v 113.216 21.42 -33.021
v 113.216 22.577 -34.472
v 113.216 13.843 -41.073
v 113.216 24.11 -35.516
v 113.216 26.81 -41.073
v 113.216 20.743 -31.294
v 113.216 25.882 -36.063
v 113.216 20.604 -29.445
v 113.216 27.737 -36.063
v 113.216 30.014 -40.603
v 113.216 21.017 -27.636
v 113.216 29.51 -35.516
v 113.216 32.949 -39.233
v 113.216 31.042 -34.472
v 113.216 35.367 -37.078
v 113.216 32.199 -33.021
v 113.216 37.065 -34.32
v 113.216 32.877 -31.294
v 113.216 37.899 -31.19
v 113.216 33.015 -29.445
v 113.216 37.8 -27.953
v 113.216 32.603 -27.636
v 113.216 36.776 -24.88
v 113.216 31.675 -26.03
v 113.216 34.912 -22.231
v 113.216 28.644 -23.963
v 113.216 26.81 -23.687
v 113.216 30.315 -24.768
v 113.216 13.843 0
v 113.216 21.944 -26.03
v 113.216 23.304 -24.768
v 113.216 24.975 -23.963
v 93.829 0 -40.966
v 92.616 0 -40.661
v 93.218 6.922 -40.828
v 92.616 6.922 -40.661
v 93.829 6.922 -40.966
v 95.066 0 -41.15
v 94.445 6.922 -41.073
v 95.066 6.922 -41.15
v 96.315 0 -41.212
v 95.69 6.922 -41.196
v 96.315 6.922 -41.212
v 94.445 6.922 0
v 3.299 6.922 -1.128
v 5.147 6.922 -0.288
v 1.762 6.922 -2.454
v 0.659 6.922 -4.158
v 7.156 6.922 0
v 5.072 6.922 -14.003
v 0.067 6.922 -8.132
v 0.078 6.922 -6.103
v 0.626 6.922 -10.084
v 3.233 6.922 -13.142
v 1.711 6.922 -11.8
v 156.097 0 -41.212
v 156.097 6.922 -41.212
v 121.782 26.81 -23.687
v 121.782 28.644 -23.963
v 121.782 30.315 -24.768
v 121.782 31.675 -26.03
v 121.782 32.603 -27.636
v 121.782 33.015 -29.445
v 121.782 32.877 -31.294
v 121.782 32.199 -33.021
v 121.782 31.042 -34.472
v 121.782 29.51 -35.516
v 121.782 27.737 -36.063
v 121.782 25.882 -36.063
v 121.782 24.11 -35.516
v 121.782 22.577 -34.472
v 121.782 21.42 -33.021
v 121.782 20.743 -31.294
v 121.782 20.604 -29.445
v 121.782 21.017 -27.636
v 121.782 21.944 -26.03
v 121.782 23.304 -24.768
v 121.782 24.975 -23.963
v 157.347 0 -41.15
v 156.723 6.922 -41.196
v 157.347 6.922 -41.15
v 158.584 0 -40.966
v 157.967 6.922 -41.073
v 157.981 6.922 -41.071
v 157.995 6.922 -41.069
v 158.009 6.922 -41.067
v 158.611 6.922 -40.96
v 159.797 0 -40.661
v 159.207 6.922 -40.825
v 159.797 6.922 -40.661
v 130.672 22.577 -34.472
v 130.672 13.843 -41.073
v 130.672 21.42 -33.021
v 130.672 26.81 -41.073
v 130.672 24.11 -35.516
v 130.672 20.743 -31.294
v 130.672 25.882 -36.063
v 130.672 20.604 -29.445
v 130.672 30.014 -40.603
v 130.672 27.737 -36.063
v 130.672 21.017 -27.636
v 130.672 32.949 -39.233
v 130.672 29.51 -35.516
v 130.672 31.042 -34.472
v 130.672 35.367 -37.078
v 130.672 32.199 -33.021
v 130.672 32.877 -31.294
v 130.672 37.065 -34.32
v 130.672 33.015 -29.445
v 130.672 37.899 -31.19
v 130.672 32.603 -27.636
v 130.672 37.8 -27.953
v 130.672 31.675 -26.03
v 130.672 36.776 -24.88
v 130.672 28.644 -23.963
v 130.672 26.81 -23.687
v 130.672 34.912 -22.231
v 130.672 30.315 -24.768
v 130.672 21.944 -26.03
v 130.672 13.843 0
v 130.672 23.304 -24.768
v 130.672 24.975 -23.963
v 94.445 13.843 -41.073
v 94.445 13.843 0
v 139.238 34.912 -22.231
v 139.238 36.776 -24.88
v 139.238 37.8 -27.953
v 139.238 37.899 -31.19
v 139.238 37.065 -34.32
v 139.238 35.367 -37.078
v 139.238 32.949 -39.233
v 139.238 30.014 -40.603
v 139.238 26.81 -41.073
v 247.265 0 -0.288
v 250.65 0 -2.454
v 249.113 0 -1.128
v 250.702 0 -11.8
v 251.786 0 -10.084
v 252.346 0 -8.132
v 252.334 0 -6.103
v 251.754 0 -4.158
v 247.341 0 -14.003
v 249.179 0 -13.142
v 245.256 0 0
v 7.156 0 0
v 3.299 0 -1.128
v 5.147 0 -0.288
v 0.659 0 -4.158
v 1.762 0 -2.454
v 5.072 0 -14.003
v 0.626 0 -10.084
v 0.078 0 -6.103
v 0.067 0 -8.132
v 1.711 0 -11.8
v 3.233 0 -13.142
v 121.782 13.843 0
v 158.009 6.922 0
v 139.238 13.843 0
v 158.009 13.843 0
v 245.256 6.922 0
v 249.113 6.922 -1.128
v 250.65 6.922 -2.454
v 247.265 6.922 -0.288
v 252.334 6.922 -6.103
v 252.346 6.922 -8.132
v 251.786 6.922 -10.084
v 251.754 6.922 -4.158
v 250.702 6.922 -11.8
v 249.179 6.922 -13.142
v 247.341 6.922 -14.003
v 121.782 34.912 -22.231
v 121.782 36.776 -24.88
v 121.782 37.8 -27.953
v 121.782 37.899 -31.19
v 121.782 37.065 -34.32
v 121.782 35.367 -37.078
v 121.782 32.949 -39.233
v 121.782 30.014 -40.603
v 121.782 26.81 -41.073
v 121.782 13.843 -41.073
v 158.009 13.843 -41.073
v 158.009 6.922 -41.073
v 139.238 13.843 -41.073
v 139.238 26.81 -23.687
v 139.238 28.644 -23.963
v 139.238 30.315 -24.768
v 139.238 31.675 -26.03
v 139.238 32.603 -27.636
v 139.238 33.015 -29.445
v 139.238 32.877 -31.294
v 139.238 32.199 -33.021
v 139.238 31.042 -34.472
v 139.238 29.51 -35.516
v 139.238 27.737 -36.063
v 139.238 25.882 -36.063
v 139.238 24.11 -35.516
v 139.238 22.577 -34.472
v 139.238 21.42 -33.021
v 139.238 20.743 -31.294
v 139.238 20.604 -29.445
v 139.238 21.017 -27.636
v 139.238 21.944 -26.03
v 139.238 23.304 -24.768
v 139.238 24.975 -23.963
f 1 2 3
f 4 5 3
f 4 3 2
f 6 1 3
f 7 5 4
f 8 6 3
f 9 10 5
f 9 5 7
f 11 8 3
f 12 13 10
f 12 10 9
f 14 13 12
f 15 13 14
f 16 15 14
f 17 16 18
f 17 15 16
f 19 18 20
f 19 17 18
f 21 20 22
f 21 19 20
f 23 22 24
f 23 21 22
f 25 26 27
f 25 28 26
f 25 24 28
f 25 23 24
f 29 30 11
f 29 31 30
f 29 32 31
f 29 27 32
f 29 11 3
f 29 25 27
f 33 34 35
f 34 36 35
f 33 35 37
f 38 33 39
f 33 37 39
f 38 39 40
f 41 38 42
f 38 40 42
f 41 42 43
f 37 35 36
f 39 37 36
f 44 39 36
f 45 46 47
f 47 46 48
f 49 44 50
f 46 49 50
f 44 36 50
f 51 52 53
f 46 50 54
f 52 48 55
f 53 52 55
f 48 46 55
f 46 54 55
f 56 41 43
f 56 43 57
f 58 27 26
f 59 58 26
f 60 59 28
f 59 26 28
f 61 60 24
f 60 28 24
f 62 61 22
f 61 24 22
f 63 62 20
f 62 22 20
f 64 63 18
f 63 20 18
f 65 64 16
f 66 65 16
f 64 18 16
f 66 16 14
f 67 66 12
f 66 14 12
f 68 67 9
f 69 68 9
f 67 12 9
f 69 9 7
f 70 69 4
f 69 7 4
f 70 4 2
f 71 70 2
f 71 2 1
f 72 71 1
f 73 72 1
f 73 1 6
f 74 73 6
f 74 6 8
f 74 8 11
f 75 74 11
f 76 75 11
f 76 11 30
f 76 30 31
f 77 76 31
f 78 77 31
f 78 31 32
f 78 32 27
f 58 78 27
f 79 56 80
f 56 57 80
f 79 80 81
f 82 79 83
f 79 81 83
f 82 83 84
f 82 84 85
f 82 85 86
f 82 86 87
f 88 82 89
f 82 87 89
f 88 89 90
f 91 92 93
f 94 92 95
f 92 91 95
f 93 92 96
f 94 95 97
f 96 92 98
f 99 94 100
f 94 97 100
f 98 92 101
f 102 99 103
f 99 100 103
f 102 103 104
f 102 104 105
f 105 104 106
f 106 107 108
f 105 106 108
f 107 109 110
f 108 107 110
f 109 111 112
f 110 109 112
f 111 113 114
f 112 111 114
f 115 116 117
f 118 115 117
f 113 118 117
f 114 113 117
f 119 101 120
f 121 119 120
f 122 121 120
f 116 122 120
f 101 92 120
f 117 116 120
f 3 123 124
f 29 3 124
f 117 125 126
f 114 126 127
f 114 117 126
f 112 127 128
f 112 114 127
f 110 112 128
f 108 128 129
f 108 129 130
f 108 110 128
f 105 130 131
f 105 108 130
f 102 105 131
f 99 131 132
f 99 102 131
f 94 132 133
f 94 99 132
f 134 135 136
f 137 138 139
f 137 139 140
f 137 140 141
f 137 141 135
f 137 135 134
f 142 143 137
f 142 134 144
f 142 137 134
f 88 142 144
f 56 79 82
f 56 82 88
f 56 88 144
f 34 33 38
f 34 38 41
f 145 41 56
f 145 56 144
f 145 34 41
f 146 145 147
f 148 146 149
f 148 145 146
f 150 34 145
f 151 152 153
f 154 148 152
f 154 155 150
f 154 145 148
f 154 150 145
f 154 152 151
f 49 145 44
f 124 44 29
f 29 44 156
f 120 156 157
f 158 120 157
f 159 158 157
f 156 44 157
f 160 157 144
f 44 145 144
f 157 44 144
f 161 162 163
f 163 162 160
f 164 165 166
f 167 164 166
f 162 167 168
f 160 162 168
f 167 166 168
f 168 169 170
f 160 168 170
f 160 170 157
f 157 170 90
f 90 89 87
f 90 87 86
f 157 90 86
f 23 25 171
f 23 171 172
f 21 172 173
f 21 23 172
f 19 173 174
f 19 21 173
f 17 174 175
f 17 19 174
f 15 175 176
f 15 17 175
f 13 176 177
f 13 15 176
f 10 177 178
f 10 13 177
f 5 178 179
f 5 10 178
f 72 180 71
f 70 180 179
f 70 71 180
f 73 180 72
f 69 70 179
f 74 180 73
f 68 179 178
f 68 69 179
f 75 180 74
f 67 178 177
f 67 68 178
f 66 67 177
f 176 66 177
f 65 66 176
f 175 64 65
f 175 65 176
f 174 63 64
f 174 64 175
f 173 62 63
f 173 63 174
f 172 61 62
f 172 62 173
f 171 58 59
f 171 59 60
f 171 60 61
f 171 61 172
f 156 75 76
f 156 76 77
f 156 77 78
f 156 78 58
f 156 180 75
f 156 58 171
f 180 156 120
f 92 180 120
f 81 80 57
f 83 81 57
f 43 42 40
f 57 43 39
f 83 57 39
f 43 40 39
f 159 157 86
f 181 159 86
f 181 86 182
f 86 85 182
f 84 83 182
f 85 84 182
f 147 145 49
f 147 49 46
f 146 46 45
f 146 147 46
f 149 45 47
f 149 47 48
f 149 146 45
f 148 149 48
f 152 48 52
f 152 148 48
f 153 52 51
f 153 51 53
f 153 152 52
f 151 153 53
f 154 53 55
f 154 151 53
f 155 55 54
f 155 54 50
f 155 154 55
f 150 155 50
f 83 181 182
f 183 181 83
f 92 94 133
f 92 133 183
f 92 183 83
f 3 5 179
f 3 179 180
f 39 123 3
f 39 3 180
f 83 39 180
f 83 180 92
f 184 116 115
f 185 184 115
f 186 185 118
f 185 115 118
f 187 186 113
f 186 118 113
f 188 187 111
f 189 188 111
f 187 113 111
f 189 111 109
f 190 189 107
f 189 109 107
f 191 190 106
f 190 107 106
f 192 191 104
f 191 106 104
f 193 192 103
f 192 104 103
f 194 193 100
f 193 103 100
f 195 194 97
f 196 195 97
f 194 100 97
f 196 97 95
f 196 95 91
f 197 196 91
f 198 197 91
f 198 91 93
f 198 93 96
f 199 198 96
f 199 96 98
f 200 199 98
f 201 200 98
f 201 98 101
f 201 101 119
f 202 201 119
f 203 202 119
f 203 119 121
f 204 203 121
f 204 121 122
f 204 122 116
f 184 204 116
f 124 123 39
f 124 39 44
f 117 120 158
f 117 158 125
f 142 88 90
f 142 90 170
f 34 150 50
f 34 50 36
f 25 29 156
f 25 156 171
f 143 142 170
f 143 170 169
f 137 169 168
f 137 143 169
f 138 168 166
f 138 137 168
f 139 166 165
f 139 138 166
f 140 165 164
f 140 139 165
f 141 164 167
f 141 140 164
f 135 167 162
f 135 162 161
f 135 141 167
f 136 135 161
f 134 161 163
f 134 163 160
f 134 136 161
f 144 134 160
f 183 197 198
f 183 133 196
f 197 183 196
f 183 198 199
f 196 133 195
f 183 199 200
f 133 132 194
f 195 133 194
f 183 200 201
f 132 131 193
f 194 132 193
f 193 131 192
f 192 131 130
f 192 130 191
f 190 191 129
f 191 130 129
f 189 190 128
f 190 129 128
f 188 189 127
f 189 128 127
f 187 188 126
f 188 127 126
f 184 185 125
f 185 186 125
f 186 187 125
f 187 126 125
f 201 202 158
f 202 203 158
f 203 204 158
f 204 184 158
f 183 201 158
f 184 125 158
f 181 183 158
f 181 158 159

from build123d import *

# Parameters (mm, degrees)
BOSS_EXTRUDE1_DEPTH = 6.9215
FILLET1_R           = 12.7
SKETCH2_W           = 63.5635
SKETCH2_H           = 41.073046068
BOSS_EXTRUDE2_DEPTH = 6.9215
SKETCH3_R           = 6.223
BOSS_EXTRUDE4_DEPTH = 44.7929
SKETCH3_2_R         = 6.223
CUT_EXTRUDE1_DEPTH  = 18.7706
SKETCH4_W           = 8.89
SKETCH4_H           = 24.13
CUT_EXTRUDE2_DEPTH  = 42.2115


with BuildPart() as part:
    # Sketch1 → Boss-Extrude1 (new body)
    with BuildSketch(Plane(origin=(0, 0, 0), x_dir=(1, 0, 0), z_dir=(0, 1, 0))):
        with BuildLine():
            Line((5.071738793, 14.002525941), (94.4245, 41.2115))
            Line((94.4245, 41.2115), (157.988, 41.2115))
            Line((157.988, 41.2115), (247.340761207, 14.002525941))
            ThreePointArc((247.340761207, 14.002525941), (252.334481209, 6.102605506), (245.25605, 0))
            Line((245.25605, 0), (7.15645, 0))
            ThreePointArc((7.15645, 0), (0.078018791, 6.102605506), (5.071738793, 14.002525941))
        make_face()
    extrude(amount=BOSS_EXTRUDE1_DEPTH)

    # Fillet1
    fillet1_edges = [part.edges().sort_by_distance(p)[0] for p in [
        (94.4245, 3.46075, -41.2115),
        (157.988, 3.46075, -41.2115),
    ]]
    fillet(fillet1_edges, radius=FILLET1_R)

    # Sketch2 → Boss-Extrude2 (add)
    with BuildSketch(Plane(origin=(0, 6.9215, 0), x_dir=(1, 0, 0), z_dir=(0, 1, 0))):
        with Locations((126.226863171, 20.536523034)):
            Rectangle(SKETCH2_W, SKETCH2_H)
    extrude(amount=BOSS_EXTRUDE2_DEPTH)

    # Sketch3 → Boss-Extrude4 (add)
    with BuildSketch(Plane.ZY.offset(-94.445113171)):
        with BuildLine():
            Line((-41.073046068, 26.8097), (-41.073046068, 13.843))
            Line((-41.073046068, 13.843), (0, 13.843))
            Line((0, 13.843), (-22.230594652, 34.912162614))
            ThreePointArc((-22.230594652, 34.912162614), (-34.319655131, 37.065038558), (-41.073046068, 26.8097))
        make_face()
        with Locations((-29.909746068, 26.8097)):
            Circle(SKETCH3_R, mode=Mode.SUBTRACT)
    extrude(amount=-BOSS_EXTRUDE4_DEPTH)

    # Sketch3<2> → Cut-Extrude1 (cut)
    with BuildSketch(Plane.ZY.offset(-94.445113171)):
        with BuildLine():
            Line((-41.073046068, 26.8097), (-41.073046068, 13.843))
            Line((-41.073046068, 13.843), (0, 13.843))
            Line((0, 13.843), (-22.230594652, 34.912162614))
            ThreePointArc((-22.230594652, 34.912162614), (-34.319655131, 37.065038558), (-41.073046068, 26.8097))
        make_face()
        with Locations((-29.909746068, 26.8097)):
            Circle(SKETCH3_2_R, mode=Mode.SUBTRACT)
    extrude(amount=-CUT_EXTRUDE1_DEPTH, mode=Mode.SUBTRACT)

    # Sketch4 → Cut-Extrude2 (cut, through all)
    with BuildSketch(Plane.XY):
        with Locations((126.226863171, 25.908)):
            Rectangle(SKETCH4_W, SKETCH4_H)
    extrude(amount=-CUT_EXTRUDE2_DEPTH, mode=Mode.SUBTRACT)


solid = part.part
